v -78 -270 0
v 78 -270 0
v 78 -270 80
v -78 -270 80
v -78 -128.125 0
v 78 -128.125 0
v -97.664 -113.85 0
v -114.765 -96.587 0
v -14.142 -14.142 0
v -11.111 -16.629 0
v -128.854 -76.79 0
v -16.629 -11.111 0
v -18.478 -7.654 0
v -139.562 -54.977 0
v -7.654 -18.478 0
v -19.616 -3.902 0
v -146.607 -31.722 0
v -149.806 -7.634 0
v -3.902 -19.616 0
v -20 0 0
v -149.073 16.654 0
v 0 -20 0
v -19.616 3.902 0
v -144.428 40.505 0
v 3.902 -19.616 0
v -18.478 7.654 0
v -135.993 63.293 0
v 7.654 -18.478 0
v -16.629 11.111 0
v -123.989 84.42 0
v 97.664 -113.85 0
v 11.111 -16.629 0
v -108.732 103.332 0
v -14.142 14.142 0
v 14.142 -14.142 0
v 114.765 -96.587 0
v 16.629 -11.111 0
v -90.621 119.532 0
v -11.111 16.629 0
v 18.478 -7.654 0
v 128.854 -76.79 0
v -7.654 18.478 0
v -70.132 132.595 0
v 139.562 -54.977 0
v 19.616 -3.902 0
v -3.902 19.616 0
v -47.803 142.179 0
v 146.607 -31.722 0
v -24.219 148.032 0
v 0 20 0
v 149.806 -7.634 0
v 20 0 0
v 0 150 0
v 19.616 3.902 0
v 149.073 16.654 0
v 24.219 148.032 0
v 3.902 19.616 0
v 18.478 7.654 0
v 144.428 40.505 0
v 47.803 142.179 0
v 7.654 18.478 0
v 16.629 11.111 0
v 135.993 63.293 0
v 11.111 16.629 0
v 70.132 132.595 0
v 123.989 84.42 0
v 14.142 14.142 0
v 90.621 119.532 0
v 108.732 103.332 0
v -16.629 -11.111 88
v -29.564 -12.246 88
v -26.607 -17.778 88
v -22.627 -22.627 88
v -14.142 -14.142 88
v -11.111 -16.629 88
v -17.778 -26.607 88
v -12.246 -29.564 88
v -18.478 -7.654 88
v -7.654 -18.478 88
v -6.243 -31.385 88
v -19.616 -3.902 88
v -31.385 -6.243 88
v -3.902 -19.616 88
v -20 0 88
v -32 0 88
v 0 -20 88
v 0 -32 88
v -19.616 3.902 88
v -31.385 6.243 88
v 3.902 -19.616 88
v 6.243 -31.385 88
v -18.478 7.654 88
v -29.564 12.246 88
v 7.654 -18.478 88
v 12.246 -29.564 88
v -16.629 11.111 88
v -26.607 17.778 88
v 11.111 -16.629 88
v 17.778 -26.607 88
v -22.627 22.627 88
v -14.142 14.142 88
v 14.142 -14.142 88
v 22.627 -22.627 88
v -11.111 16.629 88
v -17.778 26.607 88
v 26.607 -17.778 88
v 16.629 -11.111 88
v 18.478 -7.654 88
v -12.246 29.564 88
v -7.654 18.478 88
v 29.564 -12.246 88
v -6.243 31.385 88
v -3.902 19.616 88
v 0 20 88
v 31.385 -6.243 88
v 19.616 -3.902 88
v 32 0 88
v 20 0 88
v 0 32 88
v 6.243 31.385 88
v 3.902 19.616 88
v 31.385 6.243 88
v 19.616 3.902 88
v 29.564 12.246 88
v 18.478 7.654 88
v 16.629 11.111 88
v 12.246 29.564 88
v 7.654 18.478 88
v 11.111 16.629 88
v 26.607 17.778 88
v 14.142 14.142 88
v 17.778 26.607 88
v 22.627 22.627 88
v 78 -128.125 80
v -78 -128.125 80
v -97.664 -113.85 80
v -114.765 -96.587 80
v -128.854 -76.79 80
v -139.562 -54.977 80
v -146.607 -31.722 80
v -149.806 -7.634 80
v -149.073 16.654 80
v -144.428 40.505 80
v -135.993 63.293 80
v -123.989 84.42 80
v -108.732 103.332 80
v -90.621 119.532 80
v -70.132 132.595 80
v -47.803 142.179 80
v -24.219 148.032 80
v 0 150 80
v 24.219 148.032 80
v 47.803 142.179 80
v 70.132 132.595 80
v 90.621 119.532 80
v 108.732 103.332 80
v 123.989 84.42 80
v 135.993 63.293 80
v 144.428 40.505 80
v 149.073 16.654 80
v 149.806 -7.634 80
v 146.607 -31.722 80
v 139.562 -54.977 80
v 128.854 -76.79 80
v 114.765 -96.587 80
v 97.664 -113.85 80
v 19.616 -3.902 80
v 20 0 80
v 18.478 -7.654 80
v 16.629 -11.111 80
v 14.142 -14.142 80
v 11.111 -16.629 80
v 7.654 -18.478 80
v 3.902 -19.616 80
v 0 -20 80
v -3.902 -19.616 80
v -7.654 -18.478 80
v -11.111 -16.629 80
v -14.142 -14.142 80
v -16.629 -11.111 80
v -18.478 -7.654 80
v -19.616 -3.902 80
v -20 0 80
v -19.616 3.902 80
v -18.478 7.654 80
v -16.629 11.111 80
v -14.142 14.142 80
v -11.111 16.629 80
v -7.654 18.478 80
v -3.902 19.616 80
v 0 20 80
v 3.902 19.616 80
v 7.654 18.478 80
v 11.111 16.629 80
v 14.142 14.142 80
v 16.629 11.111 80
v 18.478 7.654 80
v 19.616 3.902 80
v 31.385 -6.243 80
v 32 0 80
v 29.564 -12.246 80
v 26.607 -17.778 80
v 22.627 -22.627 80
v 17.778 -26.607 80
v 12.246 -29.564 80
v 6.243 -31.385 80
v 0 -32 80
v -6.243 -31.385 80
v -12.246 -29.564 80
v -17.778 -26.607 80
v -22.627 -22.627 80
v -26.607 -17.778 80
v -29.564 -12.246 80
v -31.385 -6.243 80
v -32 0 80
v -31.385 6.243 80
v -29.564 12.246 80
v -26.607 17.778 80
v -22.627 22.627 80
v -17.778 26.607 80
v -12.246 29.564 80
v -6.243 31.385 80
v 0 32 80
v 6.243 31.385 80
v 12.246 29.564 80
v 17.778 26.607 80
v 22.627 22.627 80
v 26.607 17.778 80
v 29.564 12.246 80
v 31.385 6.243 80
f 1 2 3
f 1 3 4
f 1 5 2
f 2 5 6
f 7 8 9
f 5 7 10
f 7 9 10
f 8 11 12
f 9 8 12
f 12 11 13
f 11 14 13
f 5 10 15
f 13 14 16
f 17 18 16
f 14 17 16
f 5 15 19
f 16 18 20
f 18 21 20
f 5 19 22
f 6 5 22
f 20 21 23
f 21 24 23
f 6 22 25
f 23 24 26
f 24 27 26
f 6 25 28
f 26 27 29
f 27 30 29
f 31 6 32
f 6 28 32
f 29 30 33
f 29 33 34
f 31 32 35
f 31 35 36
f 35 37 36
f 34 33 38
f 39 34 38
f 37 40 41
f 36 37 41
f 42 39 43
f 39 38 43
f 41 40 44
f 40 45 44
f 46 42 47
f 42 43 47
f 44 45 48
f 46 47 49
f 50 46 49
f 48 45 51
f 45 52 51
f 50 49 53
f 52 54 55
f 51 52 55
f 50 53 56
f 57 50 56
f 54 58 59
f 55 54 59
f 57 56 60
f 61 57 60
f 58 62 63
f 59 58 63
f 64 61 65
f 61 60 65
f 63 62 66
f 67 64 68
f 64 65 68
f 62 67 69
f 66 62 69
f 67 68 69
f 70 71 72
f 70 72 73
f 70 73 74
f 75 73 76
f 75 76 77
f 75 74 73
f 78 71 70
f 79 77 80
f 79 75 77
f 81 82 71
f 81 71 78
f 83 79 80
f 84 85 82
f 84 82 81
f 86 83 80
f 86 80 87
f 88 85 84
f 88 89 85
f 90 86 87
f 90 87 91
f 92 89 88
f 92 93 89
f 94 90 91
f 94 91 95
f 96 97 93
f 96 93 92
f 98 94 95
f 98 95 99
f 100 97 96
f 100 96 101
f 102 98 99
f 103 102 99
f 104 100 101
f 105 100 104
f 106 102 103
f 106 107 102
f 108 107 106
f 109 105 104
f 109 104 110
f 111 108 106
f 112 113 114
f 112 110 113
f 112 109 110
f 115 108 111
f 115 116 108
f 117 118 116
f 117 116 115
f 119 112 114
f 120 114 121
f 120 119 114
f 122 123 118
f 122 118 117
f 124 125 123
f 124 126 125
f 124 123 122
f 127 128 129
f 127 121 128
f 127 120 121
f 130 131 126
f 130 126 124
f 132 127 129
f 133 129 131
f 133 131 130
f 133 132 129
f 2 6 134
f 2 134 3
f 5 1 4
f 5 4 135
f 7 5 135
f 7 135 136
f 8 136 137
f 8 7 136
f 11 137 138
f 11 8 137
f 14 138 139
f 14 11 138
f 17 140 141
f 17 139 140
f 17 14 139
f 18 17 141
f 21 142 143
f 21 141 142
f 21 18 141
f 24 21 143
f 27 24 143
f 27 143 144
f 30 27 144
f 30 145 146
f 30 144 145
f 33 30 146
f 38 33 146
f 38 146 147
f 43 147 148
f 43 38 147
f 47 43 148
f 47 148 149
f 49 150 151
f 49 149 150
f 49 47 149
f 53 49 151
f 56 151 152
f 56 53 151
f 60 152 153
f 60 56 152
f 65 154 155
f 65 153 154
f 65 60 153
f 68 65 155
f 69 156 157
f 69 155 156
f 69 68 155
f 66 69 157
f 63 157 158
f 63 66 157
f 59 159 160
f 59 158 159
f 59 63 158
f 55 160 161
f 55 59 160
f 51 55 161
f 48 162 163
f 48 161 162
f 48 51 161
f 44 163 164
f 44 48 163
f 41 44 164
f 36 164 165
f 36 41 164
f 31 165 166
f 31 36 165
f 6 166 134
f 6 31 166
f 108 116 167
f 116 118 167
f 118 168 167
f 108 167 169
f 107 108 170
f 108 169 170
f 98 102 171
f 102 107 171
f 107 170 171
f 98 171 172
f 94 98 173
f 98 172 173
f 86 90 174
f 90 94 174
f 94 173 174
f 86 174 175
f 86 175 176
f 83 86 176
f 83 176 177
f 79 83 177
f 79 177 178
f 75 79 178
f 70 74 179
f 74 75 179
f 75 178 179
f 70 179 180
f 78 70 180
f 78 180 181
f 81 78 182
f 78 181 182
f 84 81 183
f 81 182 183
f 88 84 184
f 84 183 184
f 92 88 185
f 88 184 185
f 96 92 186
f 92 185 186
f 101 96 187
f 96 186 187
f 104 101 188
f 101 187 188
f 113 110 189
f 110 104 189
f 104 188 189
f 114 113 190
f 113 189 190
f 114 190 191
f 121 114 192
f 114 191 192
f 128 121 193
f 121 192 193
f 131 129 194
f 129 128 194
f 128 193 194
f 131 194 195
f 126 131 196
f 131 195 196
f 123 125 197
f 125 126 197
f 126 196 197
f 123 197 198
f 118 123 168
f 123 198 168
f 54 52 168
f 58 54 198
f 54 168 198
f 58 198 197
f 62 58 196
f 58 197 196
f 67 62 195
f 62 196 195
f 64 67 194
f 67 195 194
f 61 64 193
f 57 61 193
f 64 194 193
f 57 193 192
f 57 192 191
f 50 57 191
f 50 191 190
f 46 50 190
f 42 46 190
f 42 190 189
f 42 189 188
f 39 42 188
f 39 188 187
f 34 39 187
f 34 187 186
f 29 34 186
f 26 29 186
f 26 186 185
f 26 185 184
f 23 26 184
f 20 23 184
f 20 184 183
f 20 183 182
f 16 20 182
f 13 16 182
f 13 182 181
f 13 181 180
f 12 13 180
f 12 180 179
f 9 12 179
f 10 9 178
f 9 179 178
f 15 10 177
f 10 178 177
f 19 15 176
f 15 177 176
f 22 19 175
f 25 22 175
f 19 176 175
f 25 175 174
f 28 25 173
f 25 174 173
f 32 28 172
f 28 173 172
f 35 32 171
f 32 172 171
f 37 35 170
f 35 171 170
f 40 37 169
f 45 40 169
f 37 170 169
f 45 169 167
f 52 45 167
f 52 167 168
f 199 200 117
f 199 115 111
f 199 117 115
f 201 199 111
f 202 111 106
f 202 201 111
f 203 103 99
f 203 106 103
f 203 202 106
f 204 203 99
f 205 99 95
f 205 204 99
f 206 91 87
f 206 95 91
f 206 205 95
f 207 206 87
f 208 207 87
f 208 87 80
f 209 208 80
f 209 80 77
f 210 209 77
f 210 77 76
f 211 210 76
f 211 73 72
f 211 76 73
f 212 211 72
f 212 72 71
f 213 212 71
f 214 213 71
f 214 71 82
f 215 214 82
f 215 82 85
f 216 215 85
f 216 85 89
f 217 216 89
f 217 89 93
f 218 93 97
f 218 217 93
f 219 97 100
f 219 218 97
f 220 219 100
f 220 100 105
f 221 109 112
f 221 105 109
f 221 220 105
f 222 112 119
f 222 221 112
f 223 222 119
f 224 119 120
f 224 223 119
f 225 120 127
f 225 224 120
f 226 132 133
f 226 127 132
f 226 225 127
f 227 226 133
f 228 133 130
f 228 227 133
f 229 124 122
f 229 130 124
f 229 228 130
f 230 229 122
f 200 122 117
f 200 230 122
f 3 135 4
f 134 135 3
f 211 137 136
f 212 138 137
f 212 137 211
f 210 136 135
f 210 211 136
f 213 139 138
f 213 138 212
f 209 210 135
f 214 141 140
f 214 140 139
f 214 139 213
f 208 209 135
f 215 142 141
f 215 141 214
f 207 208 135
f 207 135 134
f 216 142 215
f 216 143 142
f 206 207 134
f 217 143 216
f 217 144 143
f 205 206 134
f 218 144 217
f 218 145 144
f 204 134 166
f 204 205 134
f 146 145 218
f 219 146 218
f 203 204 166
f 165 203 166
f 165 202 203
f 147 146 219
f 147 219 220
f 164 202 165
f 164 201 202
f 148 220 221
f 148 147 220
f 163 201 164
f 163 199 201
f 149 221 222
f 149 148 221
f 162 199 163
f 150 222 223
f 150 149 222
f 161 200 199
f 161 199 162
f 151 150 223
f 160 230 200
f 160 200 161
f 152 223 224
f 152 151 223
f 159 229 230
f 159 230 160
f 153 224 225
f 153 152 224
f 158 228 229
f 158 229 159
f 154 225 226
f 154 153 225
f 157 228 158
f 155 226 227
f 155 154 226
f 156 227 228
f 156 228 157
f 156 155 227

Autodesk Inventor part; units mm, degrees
ref_plane "YZ Plane" through (0, 0, 0) normal (1, 0, 0) x (0, 1, 0)
ref_plane "XZ Plane" through (0, 0, 0) normal (0, 1, 0) x (-1, 0, 0)
ref_plane "XY Plane" through (0, 0, 0) normal (0, 0, 1) x (1, 0, 0)
sketch "Sketch1" plane through (0, 0, 0) normal (0, 0, 1) x (1, 0, 0)
  arc A0 (78, -128.1249) -> (-78, -128.1249) centre (0, 0) ccw
  line L0 (78, -128.1249) -> (78, -270)
  line L1 (78, -270) -> (-78, -270)
  line L2 (-78, -270) -> (-78, -128.1249)
  line L3 (-78, -30) -> (78, -270) construction
  line L4 (78, -30) -> (-78, -270) construction
extrude "Extrusion1" add sketch "Sketch1" along normal blind 80
sketch "Sketch2" plane through (0, 0, 80) normal (0, 0, 1) x (1, 0, 0)
  circle A0 centre (0, 0) radius 20
extrude "Extrusion2" cut sketch "Sketch2" against normal through all
sketch "Sketch3" plane through (0, 0, 80) normal (0, 0, 1) x (1, 0, 0)
  circle A0 centre (0, 0) radius 32
sketch "Sketch4" plane through (0, 0, 80) normal (0, 0, 1) x (1, 0, 0)
  circle A0 centre (0, 0) radius 20
extrude "Extrusion3" add sketch "Sketch3" along normal blind 8
extrude "Extrusion4" cut sketch "Sketch4" along normal blind 8
properties part number "BigCounterWeight"
